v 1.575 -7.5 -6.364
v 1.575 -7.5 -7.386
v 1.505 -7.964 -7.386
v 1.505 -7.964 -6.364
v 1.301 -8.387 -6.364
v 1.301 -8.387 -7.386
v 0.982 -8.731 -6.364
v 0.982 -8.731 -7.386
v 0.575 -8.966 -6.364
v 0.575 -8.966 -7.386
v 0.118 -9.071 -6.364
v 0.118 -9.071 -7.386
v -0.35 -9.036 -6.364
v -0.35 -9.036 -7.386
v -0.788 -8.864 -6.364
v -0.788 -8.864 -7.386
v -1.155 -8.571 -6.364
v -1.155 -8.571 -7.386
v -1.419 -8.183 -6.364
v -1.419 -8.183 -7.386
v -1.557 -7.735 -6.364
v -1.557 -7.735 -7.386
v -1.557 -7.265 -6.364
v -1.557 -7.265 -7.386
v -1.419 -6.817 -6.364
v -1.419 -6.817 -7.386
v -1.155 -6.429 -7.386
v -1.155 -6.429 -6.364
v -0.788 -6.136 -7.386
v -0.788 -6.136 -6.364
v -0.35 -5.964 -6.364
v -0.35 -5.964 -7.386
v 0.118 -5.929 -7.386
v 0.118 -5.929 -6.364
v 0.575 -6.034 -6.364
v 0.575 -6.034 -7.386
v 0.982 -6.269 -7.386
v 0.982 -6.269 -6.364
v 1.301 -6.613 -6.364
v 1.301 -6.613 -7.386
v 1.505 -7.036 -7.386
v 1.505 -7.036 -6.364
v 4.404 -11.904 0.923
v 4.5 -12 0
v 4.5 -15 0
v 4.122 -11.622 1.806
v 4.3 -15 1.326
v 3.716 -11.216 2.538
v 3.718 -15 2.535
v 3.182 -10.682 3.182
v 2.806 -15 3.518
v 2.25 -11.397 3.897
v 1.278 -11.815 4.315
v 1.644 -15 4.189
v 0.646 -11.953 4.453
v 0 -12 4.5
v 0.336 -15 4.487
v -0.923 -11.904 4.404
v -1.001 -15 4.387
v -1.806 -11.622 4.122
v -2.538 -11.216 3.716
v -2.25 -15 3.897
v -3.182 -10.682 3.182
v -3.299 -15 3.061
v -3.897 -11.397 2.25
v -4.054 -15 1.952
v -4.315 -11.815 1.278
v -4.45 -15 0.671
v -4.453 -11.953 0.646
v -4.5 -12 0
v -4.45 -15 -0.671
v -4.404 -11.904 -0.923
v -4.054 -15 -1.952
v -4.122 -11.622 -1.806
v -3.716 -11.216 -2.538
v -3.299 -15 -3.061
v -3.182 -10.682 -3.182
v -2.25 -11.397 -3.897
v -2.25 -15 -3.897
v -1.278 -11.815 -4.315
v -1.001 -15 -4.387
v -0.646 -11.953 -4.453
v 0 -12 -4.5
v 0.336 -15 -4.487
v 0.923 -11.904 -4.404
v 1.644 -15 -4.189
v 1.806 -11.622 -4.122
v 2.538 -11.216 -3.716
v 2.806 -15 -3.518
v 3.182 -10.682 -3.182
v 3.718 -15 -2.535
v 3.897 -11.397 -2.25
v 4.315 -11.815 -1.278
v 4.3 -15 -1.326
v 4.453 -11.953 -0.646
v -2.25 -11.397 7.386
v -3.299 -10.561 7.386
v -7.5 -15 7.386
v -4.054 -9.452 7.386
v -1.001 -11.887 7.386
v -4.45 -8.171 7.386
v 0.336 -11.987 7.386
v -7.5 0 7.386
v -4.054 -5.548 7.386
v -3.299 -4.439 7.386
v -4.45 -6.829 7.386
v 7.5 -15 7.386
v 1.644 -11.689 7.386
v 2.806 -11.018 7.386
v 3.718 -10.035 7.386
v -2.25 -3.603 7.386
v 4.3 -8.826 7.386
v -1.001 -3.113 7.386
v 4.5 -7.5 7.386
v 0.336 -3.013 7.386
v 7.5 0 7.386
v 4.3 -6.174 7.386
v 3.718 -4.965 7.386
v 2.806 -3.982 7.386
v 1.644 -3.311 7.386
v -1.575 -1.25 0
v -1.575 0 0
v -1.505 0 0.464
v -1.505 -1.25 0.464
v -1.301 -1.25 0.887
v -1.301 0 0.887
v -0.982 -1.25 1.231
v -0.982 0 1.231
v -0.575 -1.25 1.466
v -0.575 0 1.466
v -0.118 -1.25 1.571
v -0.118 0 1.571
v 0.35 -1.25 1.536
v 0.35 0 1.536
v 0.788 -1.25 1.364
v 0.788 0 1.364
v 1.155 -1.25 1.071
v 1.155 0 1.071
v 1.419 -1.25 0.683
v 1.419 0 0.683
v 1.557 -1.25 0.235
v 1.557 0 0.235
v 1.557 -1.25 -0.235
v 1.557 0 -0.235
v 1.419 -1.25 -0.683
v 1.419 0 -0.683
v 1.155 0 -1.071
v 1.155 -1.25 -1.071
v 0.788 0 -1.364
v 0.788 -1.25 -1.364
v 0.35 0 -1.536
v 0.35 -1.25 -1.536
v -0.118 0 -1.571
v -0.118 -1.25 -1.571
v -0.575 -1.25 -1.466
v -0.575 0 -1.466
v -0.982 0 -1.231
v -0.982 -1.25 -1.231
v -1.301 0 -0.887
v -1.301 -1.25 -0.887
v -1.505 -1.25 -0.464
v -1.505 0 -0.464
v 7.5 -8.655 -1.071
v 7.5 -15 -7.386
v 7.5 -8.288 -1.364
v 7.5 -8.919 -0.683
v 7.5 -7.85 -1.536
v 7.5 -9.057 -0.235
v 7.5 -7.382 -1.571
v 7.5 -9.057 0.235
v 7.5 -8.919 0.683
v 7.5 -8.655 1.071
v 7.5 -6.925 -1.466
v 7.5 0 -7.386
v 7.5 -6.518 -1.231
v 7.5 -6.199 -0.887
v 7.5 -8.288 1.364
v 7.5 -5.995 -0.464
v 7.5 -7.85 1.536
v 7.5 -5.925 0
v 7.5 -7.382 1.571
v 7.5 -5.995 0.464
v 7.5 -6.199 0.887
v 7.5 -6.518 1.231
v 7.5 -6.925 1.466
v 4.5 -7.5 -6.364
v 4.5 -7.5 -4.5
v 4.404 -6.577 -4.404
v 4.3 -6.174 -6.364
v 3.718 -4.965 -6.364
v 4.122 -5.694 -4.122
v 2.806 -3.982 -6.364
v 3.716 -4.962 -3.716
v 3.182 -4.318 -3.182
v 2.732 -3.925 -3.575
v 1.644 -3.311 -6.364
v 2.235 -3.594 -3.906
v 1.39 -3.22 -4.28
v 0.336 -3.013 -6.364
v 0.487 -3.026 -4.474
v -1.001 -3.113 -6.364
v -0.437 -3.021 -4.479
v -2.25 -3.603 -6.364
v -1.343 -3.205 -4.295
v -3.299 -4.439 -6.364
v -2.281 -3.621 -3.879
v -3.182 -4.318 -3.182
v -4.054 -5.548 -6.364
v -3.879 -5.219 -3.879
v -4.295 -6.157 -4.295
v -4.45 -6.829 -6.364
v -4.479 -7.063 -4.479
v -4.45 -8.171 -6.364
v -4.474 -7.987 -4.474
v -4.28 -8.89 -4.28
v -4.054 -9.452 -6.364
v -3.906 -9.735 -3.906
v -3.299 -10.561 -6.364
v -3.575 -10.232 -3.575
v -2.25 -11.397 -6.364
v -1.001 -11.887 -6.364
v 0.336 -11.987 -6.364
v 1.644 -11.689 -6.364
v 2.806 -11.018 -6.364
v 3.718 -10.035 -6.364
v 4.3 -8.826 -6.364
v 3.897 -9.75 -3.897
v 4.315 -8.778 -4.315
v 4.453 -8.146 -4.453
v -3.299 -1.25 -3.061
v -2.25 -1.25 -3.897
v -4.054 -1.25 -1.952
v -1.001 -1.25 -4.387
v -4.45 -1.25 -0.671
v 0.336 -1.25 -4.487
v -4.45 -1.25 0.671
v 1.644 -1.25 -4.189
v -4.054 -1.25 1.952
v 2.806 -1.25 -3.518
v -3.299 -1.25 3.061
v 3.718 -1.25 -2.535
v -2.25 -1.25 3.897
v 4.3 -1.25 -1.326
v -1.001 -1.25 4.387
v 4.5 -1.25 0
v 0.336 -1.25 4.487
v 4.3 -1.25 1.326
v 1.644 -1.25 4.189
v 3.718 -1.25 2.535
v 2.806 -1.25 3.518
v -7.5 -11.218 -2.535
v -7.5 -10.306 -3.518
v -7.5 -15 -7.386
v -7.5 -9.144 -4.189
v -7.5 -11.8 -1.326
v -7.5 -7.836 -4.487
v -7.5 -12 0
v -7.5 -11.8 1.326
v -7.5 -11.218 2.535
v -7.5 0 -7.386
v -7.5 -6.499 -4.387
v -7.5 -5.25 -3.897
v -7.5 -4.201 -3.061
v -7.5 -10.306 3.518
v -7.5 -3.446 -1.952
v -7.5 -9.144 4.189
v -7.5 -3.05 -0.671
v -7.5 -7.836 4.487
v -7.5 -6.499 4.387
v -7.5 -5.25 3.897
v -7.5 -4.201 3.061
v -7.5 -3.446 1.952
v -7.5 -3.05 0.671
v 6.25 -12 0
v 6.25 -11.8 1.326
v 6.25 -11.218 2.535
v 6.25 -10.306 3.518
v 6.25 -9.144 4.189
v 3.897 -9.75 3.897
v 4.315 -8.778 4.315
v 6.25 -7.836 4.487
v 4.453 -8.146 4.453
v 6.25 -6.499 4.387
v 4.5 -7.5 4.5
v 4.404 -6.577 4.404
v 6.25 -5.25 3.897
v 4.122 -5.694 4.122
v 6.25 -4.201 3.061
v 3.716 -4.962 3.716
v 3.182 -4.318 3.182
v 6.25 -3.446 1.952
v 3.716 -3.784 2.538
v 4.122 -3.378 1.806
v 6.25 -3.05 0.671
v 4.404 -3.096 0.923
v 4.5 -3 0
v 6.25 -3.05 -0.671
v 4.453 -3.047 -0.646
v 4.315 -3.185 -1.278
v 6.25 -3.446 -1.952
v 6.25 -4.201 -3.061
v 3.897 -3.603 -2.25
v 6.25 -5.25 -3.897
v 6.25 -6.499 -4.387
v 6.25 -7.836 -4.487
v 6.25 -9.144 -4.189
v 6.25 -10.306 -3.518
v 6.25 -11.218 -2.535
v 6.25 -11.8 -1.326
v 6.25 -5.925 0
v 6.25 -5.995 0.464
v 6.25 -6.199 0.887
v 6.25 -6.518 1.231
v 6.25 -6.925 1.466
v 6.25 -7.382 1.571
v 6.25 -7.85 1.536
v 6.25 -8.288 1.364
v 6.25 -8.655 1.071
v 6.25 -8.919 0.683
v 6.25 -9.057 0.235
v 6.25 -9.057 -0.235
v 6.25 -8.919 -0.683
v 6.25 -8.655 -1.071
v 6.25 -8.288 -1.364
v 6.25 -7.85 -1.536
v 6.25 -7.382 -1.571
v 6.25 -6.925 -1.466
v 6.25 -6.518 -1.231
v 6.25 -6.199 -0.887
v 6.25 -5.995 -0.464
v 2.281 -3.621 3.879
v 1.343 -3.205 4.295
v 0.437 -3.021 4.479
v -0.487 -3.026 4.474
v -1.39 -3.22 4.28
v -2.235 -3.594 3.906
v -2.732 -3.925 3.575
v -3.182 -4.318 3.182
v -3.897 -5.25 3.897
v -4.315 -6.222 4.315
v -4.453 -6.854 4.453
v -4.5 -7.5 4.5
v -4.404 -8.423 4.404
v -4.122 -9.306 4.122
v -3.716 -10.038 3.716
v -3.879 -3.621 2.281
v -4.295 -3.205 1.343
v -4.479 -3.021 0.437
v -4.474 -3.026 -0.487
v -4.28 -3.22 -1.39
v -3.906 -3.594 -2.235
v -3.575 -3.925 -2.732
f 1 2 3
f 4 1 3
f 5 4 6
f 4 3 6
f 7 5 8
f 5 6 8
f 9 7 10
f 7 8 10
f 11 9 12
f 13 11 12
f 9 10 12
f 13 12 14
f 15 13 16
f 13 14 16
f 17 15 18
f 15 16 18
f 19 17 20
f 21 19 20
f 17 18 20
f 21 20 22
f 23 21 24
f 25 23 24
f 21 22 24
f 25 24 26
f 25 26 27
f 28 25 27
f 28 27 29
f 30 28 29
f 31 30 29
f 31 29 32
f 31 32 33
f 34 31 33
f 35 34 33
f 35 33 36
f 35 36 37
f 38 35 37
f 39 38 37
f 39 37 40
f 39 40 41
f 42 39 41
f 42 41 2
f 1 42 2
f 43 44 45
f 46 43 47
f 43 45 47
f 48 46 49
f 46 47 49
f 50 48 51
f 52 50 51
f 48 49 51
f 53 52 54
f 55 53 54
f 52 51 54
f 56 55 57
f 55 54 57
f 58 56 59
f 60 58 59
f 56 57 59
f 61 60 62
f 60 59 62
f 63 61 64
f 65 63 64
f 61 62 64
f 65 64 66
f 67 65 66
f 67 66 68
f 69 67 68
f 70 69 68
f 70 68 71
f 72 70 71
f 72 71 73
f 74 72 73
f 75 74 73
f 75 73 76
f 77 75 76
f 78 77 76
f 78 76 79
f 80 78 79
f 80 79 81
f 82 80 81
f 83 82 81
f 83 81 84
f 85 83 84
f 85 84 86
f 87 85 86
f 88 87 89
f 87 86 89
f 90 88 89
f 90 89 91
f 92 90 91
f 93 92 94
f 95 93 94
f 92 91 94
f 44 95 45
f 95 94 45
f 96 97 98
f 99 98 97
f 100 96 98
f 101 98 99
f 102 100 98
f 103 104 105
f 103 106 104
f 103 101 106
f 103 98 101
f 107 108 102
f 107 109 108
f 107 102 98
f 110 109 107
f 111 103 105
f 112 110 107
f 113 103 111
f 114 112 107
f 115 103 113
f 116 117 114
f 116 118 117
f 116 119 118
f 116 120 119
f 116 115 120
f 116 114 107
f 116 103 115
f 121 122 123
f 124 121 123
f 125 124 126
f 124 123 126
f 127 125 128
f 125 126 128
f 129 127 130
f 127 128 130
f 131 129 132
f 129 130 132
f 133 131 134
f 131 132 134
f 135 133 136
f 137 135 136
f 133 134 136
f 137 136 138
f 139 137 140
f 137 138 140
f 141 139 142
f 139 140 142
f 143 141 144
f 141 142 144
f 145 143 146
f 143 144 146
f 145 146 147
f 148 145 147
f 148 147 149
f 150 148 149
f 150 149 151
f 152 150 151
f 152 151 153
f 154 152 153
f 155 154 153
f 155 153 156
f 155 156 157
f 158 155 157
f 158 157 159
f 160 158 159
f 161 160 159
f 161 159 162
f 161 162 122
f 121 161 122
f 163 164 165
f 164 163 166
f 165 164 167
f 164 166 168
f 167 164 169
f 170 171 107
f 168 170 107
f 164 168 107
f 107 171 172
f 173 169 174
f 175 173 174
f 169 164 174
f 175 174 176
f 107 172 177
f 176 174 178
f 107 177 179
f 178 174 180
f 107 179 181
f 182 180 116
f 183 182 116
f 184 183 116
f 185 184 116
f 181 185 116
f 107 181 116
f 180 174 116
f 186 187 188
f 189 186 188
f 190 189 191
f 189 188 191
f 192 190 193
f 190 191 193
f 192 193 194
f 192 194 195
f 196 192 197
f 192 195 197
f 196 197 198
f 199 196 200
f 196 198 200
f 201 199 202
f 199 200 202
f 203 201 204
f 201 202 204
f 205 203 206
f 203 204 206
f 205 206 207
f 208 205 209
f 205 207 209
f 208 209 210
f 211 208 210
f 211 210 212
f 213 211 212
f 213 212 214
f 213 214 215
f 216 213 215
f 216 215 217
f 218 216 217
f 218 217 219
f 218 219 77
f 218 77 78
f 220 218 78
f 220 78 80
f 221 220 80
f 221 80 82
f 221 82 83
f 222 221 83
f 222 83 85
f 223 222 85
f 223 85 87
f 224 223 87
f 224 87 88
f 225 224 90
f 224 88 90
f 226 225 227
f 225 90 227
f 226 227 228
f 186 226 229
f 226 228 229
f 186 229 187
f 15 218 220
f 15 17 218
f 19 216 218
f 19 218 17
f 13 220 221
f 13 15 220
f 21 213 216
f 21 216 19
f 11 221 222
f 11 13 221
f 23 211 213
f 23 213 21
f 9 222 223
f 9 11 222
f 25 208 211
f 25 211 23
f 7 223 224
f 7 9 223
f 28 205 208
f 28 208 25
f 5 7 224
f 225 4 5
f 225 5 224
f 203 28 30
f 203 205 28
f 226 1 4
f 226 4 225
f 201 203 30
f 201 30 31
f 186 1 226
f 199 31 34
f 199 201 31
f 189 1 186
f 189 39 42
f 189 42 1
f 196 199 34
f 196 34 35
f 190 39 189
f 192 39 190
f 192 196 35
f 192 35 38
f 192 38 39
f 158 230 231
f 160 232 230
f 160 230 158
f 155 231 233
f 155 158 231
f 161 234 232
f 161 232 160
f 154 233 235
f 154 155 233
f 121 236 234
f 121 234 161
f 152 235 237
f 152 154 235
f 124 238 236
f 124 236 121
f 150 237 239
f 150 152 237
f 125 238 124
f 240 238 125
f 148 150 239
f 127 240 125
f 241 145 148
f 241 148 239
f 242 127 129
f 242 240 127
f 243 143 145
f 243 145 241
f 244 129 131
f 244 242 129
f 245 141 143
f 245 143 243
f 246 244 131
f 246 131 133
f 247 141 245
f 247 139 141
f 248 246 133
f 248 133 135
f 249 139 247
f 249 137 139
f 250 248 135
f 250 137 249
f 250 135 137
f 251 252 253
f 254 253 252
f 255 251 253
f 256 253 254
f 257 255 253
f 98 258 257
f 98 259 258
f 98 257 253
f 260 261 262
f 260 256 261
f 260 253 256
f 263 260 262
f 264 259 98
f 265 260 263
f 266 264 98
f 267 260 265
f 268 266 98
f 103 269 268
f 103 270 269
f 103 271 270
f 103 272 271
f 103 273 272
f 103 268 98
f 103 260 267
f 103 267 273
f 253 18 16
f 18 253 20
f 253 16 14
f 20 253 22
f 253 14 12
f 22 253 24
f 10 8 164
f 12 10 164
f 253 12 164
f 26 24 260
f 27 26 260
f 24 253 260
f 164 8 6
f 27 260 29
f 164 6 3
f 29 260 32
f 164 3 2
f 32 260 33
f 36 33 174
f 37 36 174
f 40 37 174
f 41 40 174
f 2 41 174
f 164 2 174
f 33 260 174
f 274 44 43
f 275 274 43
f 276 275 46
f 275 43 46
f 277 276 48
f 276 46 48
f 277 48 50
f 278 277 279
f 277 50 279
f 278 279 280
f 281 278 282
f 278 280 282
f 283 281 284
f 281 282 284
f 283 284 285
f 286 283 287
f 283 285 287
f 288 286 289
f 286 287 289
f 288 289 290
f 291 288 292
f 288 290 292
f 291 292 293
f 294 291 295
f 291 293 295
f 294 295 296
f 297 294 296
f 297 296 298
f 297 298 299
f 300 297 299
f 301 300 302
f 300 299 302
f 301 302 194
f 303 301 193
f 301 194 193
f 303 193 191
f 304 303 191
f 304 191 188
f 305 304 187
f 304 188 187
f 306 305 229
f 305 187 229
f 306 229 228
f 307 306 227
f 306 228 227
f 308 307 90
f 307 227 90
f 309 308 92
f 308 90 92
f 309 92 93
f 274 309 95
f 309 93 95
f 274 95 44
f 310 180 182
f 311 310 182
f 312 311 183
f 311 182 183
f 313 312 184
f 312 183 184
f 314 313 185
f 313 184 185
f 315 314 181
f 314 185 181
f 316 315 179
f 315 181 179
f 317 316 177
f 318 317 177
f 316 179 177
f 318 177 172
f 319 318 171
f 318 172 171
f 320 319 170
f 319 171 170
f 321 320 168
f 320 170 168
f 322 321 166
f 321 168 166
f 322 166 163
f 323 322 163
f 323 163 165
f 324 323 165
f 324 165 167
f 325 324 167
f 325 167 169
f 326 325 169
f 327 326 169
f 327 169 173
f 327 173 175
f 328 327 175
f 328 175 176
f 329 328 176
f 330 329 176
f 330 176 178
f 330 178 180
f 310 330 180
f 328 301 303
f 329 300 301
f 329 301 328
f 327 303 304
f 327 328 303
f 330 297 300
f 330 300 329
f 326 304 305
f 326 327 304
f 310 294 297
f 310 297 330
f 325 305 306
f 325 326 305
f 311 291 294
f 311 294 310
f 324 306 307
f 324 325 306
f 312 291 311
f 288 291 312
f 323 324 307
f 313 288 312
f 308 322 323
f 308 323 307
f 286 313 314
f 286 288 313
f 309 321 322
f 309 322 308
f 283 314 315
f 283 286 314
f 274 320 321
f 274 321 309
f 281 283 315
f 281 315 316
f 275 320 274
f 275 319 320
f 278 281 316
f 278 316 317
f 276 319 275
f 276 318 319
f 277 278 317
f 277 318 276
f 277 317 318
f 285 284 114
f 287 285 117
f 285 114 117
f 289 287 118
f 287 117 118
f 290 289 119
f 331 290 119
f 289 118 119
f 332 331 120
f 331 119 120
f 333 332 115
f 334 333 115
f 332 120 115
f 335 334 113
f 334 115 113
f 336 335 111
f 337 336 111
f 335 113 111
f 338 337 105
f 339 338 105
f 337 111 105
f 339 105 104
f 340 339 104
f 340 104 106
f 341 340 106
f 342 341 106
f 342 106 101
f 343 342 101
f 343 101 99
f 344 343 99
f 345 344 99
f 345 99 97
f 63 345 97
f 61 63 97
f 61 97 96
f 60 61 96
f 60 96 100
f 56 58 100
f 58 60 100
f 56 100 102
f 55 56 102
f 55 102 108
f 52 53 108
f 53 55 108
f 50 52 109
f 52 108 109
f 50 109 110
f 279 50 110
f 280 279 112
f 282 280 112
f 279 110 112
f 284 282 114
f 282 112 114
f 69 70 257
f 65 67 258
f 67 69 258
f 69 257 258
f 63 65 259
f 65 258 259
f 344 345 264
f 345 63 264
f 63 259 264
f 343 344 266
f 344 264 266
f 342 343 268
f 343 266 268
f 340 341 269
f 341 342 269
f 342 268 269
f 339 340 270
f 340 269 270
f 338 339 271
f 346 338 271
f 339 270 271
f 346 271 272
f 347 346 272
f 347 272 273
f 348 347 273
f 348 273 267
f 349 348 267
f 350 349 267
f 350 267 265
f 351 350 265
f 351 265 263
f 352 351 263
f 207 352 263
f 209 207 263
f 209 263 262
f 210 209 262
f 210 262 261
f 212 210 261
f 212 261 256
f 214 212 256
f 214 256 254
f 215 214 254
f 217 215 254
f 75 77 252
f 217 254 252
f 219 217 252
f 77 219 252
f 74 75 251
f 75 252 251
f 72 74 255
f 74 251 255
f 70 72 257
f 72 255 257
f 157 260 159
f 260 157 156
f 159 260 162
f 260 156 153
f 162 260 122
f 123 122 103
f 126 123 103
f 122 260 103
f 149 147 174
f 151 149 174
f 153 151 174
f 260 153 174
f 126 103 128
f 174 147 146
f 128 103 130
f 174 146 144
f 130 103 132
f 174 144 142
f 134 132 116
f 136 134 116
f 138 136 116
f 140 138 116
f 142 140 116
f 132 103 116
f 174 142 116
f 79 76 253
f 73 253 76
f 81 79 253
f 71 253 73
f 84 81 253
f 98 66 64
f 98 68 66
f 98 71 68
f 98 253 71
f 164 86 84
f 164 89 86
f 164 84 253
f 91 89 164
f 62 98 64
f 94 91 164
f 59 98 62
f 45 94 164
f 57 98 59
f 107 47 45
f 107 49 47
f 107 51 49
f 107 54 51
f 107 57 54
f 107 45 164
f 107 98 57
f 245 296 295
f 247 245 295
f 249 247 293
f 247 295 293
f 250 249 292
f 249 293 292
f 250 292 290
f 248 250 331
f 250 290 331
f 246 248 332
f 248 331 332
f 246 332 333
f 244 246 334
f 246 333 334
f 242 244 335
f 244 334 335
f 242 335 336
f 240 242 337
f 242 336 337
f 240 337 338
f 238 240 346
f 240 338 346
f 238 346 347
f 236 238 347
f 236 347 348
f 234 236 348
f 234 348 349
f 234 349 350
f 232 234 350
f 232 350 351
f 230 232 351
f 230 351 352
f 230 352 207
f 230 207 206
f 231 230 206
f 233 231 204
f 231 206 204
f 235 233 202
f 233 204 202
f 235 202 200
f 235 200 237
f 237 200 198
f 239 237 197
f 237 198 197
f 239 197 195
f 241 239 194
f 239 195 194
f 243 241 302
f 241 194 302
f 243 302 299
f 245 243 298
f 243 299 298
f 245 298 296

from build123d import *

# Parameters (mm, degrees)
F0_W      = 15
F0_H      = 14.771302
F1_DEPTH  = 15
F2_R      = 4.5
F3_DEPTH  = 13.75
F4_R      = 4.5
F5_DEPTH  = 13.75
F6_R      = 4.5
F7_DEPTH  = 13.75
F8_R      = 1.575
F9_DEPTH  = 15.001
F10_R     = 1.575
F11_DEPTH = 14.772302
F12_R     = 1.575
F13_DEPTH = 15.001


with BuildPart() as f1:
    # F0 (on Front) → F1 (new body)
    with BuildSketch(Plane.XZ):
        Rectangle(F0_W, F0_H)
    extrude(amount=F1_DEPTH)

    # F2 (on face) → F3 (cut)
    with BuildSketch(Plane.XZ.offset(15)):
        Circle(F2_R)
    extrude(amount=-F3_DEPTH, mode=Mode.SUBTRACT)

    # F4 (on face) → F5 (cut)
    with BuildSketch(Plane.XY.offset(7.385651)):
        with Locations((0, -7.5)):
            Circle(F4_R)
    extrude(amount=-F5_DEPTH, mode=Mode.SUBTRACT)

    # F6 (on face) → F7 (cut)
    with BuildSketch(Plane(origin=(-7.5, 0, 0), x_dir=(0, -1, 0), z_dir=(-1, 0, 0))):
        with Locations((7.5, 0)):
            Circle(F6_R)
    extrude(amount=-F7_DEPTH, mode=Mode.SUBTRACT)

    # F8 (on face) → F9 (cut, through all)
    with BuildSketch(Plane(origin=(0, 0, 0), x_dir=(-1, 0, 0), z_dir=(0, 1, 0))):
        Circle(F8_R)
    extrude(amount=-F9_DEPTH, mode=Mode.SUBTRACT)

    # F10 (on face) → F11 (cut, through all)
    with BuildSketch(Plane(origin=(0, 0, -7.385651), x_dir=(1, 0, 0), z_dir=(0, 0, -1))):
        with Locations((0, 7.5)):
            Circle(F10_R)
    extrude(amount=-F11_DEPTH, mode=Mode.SUBTRACT)

    # F12 (on face) → F13 (cut, through all)
    with BuildSketch(Plane.YZ.offset(7.5)):
        with Locations((-7.5, 0)):
            Circle(F12_R)
    extrude(amount=-F13_DEPTH, mode=Mode.SUBTRACT)


solid = f1.part
